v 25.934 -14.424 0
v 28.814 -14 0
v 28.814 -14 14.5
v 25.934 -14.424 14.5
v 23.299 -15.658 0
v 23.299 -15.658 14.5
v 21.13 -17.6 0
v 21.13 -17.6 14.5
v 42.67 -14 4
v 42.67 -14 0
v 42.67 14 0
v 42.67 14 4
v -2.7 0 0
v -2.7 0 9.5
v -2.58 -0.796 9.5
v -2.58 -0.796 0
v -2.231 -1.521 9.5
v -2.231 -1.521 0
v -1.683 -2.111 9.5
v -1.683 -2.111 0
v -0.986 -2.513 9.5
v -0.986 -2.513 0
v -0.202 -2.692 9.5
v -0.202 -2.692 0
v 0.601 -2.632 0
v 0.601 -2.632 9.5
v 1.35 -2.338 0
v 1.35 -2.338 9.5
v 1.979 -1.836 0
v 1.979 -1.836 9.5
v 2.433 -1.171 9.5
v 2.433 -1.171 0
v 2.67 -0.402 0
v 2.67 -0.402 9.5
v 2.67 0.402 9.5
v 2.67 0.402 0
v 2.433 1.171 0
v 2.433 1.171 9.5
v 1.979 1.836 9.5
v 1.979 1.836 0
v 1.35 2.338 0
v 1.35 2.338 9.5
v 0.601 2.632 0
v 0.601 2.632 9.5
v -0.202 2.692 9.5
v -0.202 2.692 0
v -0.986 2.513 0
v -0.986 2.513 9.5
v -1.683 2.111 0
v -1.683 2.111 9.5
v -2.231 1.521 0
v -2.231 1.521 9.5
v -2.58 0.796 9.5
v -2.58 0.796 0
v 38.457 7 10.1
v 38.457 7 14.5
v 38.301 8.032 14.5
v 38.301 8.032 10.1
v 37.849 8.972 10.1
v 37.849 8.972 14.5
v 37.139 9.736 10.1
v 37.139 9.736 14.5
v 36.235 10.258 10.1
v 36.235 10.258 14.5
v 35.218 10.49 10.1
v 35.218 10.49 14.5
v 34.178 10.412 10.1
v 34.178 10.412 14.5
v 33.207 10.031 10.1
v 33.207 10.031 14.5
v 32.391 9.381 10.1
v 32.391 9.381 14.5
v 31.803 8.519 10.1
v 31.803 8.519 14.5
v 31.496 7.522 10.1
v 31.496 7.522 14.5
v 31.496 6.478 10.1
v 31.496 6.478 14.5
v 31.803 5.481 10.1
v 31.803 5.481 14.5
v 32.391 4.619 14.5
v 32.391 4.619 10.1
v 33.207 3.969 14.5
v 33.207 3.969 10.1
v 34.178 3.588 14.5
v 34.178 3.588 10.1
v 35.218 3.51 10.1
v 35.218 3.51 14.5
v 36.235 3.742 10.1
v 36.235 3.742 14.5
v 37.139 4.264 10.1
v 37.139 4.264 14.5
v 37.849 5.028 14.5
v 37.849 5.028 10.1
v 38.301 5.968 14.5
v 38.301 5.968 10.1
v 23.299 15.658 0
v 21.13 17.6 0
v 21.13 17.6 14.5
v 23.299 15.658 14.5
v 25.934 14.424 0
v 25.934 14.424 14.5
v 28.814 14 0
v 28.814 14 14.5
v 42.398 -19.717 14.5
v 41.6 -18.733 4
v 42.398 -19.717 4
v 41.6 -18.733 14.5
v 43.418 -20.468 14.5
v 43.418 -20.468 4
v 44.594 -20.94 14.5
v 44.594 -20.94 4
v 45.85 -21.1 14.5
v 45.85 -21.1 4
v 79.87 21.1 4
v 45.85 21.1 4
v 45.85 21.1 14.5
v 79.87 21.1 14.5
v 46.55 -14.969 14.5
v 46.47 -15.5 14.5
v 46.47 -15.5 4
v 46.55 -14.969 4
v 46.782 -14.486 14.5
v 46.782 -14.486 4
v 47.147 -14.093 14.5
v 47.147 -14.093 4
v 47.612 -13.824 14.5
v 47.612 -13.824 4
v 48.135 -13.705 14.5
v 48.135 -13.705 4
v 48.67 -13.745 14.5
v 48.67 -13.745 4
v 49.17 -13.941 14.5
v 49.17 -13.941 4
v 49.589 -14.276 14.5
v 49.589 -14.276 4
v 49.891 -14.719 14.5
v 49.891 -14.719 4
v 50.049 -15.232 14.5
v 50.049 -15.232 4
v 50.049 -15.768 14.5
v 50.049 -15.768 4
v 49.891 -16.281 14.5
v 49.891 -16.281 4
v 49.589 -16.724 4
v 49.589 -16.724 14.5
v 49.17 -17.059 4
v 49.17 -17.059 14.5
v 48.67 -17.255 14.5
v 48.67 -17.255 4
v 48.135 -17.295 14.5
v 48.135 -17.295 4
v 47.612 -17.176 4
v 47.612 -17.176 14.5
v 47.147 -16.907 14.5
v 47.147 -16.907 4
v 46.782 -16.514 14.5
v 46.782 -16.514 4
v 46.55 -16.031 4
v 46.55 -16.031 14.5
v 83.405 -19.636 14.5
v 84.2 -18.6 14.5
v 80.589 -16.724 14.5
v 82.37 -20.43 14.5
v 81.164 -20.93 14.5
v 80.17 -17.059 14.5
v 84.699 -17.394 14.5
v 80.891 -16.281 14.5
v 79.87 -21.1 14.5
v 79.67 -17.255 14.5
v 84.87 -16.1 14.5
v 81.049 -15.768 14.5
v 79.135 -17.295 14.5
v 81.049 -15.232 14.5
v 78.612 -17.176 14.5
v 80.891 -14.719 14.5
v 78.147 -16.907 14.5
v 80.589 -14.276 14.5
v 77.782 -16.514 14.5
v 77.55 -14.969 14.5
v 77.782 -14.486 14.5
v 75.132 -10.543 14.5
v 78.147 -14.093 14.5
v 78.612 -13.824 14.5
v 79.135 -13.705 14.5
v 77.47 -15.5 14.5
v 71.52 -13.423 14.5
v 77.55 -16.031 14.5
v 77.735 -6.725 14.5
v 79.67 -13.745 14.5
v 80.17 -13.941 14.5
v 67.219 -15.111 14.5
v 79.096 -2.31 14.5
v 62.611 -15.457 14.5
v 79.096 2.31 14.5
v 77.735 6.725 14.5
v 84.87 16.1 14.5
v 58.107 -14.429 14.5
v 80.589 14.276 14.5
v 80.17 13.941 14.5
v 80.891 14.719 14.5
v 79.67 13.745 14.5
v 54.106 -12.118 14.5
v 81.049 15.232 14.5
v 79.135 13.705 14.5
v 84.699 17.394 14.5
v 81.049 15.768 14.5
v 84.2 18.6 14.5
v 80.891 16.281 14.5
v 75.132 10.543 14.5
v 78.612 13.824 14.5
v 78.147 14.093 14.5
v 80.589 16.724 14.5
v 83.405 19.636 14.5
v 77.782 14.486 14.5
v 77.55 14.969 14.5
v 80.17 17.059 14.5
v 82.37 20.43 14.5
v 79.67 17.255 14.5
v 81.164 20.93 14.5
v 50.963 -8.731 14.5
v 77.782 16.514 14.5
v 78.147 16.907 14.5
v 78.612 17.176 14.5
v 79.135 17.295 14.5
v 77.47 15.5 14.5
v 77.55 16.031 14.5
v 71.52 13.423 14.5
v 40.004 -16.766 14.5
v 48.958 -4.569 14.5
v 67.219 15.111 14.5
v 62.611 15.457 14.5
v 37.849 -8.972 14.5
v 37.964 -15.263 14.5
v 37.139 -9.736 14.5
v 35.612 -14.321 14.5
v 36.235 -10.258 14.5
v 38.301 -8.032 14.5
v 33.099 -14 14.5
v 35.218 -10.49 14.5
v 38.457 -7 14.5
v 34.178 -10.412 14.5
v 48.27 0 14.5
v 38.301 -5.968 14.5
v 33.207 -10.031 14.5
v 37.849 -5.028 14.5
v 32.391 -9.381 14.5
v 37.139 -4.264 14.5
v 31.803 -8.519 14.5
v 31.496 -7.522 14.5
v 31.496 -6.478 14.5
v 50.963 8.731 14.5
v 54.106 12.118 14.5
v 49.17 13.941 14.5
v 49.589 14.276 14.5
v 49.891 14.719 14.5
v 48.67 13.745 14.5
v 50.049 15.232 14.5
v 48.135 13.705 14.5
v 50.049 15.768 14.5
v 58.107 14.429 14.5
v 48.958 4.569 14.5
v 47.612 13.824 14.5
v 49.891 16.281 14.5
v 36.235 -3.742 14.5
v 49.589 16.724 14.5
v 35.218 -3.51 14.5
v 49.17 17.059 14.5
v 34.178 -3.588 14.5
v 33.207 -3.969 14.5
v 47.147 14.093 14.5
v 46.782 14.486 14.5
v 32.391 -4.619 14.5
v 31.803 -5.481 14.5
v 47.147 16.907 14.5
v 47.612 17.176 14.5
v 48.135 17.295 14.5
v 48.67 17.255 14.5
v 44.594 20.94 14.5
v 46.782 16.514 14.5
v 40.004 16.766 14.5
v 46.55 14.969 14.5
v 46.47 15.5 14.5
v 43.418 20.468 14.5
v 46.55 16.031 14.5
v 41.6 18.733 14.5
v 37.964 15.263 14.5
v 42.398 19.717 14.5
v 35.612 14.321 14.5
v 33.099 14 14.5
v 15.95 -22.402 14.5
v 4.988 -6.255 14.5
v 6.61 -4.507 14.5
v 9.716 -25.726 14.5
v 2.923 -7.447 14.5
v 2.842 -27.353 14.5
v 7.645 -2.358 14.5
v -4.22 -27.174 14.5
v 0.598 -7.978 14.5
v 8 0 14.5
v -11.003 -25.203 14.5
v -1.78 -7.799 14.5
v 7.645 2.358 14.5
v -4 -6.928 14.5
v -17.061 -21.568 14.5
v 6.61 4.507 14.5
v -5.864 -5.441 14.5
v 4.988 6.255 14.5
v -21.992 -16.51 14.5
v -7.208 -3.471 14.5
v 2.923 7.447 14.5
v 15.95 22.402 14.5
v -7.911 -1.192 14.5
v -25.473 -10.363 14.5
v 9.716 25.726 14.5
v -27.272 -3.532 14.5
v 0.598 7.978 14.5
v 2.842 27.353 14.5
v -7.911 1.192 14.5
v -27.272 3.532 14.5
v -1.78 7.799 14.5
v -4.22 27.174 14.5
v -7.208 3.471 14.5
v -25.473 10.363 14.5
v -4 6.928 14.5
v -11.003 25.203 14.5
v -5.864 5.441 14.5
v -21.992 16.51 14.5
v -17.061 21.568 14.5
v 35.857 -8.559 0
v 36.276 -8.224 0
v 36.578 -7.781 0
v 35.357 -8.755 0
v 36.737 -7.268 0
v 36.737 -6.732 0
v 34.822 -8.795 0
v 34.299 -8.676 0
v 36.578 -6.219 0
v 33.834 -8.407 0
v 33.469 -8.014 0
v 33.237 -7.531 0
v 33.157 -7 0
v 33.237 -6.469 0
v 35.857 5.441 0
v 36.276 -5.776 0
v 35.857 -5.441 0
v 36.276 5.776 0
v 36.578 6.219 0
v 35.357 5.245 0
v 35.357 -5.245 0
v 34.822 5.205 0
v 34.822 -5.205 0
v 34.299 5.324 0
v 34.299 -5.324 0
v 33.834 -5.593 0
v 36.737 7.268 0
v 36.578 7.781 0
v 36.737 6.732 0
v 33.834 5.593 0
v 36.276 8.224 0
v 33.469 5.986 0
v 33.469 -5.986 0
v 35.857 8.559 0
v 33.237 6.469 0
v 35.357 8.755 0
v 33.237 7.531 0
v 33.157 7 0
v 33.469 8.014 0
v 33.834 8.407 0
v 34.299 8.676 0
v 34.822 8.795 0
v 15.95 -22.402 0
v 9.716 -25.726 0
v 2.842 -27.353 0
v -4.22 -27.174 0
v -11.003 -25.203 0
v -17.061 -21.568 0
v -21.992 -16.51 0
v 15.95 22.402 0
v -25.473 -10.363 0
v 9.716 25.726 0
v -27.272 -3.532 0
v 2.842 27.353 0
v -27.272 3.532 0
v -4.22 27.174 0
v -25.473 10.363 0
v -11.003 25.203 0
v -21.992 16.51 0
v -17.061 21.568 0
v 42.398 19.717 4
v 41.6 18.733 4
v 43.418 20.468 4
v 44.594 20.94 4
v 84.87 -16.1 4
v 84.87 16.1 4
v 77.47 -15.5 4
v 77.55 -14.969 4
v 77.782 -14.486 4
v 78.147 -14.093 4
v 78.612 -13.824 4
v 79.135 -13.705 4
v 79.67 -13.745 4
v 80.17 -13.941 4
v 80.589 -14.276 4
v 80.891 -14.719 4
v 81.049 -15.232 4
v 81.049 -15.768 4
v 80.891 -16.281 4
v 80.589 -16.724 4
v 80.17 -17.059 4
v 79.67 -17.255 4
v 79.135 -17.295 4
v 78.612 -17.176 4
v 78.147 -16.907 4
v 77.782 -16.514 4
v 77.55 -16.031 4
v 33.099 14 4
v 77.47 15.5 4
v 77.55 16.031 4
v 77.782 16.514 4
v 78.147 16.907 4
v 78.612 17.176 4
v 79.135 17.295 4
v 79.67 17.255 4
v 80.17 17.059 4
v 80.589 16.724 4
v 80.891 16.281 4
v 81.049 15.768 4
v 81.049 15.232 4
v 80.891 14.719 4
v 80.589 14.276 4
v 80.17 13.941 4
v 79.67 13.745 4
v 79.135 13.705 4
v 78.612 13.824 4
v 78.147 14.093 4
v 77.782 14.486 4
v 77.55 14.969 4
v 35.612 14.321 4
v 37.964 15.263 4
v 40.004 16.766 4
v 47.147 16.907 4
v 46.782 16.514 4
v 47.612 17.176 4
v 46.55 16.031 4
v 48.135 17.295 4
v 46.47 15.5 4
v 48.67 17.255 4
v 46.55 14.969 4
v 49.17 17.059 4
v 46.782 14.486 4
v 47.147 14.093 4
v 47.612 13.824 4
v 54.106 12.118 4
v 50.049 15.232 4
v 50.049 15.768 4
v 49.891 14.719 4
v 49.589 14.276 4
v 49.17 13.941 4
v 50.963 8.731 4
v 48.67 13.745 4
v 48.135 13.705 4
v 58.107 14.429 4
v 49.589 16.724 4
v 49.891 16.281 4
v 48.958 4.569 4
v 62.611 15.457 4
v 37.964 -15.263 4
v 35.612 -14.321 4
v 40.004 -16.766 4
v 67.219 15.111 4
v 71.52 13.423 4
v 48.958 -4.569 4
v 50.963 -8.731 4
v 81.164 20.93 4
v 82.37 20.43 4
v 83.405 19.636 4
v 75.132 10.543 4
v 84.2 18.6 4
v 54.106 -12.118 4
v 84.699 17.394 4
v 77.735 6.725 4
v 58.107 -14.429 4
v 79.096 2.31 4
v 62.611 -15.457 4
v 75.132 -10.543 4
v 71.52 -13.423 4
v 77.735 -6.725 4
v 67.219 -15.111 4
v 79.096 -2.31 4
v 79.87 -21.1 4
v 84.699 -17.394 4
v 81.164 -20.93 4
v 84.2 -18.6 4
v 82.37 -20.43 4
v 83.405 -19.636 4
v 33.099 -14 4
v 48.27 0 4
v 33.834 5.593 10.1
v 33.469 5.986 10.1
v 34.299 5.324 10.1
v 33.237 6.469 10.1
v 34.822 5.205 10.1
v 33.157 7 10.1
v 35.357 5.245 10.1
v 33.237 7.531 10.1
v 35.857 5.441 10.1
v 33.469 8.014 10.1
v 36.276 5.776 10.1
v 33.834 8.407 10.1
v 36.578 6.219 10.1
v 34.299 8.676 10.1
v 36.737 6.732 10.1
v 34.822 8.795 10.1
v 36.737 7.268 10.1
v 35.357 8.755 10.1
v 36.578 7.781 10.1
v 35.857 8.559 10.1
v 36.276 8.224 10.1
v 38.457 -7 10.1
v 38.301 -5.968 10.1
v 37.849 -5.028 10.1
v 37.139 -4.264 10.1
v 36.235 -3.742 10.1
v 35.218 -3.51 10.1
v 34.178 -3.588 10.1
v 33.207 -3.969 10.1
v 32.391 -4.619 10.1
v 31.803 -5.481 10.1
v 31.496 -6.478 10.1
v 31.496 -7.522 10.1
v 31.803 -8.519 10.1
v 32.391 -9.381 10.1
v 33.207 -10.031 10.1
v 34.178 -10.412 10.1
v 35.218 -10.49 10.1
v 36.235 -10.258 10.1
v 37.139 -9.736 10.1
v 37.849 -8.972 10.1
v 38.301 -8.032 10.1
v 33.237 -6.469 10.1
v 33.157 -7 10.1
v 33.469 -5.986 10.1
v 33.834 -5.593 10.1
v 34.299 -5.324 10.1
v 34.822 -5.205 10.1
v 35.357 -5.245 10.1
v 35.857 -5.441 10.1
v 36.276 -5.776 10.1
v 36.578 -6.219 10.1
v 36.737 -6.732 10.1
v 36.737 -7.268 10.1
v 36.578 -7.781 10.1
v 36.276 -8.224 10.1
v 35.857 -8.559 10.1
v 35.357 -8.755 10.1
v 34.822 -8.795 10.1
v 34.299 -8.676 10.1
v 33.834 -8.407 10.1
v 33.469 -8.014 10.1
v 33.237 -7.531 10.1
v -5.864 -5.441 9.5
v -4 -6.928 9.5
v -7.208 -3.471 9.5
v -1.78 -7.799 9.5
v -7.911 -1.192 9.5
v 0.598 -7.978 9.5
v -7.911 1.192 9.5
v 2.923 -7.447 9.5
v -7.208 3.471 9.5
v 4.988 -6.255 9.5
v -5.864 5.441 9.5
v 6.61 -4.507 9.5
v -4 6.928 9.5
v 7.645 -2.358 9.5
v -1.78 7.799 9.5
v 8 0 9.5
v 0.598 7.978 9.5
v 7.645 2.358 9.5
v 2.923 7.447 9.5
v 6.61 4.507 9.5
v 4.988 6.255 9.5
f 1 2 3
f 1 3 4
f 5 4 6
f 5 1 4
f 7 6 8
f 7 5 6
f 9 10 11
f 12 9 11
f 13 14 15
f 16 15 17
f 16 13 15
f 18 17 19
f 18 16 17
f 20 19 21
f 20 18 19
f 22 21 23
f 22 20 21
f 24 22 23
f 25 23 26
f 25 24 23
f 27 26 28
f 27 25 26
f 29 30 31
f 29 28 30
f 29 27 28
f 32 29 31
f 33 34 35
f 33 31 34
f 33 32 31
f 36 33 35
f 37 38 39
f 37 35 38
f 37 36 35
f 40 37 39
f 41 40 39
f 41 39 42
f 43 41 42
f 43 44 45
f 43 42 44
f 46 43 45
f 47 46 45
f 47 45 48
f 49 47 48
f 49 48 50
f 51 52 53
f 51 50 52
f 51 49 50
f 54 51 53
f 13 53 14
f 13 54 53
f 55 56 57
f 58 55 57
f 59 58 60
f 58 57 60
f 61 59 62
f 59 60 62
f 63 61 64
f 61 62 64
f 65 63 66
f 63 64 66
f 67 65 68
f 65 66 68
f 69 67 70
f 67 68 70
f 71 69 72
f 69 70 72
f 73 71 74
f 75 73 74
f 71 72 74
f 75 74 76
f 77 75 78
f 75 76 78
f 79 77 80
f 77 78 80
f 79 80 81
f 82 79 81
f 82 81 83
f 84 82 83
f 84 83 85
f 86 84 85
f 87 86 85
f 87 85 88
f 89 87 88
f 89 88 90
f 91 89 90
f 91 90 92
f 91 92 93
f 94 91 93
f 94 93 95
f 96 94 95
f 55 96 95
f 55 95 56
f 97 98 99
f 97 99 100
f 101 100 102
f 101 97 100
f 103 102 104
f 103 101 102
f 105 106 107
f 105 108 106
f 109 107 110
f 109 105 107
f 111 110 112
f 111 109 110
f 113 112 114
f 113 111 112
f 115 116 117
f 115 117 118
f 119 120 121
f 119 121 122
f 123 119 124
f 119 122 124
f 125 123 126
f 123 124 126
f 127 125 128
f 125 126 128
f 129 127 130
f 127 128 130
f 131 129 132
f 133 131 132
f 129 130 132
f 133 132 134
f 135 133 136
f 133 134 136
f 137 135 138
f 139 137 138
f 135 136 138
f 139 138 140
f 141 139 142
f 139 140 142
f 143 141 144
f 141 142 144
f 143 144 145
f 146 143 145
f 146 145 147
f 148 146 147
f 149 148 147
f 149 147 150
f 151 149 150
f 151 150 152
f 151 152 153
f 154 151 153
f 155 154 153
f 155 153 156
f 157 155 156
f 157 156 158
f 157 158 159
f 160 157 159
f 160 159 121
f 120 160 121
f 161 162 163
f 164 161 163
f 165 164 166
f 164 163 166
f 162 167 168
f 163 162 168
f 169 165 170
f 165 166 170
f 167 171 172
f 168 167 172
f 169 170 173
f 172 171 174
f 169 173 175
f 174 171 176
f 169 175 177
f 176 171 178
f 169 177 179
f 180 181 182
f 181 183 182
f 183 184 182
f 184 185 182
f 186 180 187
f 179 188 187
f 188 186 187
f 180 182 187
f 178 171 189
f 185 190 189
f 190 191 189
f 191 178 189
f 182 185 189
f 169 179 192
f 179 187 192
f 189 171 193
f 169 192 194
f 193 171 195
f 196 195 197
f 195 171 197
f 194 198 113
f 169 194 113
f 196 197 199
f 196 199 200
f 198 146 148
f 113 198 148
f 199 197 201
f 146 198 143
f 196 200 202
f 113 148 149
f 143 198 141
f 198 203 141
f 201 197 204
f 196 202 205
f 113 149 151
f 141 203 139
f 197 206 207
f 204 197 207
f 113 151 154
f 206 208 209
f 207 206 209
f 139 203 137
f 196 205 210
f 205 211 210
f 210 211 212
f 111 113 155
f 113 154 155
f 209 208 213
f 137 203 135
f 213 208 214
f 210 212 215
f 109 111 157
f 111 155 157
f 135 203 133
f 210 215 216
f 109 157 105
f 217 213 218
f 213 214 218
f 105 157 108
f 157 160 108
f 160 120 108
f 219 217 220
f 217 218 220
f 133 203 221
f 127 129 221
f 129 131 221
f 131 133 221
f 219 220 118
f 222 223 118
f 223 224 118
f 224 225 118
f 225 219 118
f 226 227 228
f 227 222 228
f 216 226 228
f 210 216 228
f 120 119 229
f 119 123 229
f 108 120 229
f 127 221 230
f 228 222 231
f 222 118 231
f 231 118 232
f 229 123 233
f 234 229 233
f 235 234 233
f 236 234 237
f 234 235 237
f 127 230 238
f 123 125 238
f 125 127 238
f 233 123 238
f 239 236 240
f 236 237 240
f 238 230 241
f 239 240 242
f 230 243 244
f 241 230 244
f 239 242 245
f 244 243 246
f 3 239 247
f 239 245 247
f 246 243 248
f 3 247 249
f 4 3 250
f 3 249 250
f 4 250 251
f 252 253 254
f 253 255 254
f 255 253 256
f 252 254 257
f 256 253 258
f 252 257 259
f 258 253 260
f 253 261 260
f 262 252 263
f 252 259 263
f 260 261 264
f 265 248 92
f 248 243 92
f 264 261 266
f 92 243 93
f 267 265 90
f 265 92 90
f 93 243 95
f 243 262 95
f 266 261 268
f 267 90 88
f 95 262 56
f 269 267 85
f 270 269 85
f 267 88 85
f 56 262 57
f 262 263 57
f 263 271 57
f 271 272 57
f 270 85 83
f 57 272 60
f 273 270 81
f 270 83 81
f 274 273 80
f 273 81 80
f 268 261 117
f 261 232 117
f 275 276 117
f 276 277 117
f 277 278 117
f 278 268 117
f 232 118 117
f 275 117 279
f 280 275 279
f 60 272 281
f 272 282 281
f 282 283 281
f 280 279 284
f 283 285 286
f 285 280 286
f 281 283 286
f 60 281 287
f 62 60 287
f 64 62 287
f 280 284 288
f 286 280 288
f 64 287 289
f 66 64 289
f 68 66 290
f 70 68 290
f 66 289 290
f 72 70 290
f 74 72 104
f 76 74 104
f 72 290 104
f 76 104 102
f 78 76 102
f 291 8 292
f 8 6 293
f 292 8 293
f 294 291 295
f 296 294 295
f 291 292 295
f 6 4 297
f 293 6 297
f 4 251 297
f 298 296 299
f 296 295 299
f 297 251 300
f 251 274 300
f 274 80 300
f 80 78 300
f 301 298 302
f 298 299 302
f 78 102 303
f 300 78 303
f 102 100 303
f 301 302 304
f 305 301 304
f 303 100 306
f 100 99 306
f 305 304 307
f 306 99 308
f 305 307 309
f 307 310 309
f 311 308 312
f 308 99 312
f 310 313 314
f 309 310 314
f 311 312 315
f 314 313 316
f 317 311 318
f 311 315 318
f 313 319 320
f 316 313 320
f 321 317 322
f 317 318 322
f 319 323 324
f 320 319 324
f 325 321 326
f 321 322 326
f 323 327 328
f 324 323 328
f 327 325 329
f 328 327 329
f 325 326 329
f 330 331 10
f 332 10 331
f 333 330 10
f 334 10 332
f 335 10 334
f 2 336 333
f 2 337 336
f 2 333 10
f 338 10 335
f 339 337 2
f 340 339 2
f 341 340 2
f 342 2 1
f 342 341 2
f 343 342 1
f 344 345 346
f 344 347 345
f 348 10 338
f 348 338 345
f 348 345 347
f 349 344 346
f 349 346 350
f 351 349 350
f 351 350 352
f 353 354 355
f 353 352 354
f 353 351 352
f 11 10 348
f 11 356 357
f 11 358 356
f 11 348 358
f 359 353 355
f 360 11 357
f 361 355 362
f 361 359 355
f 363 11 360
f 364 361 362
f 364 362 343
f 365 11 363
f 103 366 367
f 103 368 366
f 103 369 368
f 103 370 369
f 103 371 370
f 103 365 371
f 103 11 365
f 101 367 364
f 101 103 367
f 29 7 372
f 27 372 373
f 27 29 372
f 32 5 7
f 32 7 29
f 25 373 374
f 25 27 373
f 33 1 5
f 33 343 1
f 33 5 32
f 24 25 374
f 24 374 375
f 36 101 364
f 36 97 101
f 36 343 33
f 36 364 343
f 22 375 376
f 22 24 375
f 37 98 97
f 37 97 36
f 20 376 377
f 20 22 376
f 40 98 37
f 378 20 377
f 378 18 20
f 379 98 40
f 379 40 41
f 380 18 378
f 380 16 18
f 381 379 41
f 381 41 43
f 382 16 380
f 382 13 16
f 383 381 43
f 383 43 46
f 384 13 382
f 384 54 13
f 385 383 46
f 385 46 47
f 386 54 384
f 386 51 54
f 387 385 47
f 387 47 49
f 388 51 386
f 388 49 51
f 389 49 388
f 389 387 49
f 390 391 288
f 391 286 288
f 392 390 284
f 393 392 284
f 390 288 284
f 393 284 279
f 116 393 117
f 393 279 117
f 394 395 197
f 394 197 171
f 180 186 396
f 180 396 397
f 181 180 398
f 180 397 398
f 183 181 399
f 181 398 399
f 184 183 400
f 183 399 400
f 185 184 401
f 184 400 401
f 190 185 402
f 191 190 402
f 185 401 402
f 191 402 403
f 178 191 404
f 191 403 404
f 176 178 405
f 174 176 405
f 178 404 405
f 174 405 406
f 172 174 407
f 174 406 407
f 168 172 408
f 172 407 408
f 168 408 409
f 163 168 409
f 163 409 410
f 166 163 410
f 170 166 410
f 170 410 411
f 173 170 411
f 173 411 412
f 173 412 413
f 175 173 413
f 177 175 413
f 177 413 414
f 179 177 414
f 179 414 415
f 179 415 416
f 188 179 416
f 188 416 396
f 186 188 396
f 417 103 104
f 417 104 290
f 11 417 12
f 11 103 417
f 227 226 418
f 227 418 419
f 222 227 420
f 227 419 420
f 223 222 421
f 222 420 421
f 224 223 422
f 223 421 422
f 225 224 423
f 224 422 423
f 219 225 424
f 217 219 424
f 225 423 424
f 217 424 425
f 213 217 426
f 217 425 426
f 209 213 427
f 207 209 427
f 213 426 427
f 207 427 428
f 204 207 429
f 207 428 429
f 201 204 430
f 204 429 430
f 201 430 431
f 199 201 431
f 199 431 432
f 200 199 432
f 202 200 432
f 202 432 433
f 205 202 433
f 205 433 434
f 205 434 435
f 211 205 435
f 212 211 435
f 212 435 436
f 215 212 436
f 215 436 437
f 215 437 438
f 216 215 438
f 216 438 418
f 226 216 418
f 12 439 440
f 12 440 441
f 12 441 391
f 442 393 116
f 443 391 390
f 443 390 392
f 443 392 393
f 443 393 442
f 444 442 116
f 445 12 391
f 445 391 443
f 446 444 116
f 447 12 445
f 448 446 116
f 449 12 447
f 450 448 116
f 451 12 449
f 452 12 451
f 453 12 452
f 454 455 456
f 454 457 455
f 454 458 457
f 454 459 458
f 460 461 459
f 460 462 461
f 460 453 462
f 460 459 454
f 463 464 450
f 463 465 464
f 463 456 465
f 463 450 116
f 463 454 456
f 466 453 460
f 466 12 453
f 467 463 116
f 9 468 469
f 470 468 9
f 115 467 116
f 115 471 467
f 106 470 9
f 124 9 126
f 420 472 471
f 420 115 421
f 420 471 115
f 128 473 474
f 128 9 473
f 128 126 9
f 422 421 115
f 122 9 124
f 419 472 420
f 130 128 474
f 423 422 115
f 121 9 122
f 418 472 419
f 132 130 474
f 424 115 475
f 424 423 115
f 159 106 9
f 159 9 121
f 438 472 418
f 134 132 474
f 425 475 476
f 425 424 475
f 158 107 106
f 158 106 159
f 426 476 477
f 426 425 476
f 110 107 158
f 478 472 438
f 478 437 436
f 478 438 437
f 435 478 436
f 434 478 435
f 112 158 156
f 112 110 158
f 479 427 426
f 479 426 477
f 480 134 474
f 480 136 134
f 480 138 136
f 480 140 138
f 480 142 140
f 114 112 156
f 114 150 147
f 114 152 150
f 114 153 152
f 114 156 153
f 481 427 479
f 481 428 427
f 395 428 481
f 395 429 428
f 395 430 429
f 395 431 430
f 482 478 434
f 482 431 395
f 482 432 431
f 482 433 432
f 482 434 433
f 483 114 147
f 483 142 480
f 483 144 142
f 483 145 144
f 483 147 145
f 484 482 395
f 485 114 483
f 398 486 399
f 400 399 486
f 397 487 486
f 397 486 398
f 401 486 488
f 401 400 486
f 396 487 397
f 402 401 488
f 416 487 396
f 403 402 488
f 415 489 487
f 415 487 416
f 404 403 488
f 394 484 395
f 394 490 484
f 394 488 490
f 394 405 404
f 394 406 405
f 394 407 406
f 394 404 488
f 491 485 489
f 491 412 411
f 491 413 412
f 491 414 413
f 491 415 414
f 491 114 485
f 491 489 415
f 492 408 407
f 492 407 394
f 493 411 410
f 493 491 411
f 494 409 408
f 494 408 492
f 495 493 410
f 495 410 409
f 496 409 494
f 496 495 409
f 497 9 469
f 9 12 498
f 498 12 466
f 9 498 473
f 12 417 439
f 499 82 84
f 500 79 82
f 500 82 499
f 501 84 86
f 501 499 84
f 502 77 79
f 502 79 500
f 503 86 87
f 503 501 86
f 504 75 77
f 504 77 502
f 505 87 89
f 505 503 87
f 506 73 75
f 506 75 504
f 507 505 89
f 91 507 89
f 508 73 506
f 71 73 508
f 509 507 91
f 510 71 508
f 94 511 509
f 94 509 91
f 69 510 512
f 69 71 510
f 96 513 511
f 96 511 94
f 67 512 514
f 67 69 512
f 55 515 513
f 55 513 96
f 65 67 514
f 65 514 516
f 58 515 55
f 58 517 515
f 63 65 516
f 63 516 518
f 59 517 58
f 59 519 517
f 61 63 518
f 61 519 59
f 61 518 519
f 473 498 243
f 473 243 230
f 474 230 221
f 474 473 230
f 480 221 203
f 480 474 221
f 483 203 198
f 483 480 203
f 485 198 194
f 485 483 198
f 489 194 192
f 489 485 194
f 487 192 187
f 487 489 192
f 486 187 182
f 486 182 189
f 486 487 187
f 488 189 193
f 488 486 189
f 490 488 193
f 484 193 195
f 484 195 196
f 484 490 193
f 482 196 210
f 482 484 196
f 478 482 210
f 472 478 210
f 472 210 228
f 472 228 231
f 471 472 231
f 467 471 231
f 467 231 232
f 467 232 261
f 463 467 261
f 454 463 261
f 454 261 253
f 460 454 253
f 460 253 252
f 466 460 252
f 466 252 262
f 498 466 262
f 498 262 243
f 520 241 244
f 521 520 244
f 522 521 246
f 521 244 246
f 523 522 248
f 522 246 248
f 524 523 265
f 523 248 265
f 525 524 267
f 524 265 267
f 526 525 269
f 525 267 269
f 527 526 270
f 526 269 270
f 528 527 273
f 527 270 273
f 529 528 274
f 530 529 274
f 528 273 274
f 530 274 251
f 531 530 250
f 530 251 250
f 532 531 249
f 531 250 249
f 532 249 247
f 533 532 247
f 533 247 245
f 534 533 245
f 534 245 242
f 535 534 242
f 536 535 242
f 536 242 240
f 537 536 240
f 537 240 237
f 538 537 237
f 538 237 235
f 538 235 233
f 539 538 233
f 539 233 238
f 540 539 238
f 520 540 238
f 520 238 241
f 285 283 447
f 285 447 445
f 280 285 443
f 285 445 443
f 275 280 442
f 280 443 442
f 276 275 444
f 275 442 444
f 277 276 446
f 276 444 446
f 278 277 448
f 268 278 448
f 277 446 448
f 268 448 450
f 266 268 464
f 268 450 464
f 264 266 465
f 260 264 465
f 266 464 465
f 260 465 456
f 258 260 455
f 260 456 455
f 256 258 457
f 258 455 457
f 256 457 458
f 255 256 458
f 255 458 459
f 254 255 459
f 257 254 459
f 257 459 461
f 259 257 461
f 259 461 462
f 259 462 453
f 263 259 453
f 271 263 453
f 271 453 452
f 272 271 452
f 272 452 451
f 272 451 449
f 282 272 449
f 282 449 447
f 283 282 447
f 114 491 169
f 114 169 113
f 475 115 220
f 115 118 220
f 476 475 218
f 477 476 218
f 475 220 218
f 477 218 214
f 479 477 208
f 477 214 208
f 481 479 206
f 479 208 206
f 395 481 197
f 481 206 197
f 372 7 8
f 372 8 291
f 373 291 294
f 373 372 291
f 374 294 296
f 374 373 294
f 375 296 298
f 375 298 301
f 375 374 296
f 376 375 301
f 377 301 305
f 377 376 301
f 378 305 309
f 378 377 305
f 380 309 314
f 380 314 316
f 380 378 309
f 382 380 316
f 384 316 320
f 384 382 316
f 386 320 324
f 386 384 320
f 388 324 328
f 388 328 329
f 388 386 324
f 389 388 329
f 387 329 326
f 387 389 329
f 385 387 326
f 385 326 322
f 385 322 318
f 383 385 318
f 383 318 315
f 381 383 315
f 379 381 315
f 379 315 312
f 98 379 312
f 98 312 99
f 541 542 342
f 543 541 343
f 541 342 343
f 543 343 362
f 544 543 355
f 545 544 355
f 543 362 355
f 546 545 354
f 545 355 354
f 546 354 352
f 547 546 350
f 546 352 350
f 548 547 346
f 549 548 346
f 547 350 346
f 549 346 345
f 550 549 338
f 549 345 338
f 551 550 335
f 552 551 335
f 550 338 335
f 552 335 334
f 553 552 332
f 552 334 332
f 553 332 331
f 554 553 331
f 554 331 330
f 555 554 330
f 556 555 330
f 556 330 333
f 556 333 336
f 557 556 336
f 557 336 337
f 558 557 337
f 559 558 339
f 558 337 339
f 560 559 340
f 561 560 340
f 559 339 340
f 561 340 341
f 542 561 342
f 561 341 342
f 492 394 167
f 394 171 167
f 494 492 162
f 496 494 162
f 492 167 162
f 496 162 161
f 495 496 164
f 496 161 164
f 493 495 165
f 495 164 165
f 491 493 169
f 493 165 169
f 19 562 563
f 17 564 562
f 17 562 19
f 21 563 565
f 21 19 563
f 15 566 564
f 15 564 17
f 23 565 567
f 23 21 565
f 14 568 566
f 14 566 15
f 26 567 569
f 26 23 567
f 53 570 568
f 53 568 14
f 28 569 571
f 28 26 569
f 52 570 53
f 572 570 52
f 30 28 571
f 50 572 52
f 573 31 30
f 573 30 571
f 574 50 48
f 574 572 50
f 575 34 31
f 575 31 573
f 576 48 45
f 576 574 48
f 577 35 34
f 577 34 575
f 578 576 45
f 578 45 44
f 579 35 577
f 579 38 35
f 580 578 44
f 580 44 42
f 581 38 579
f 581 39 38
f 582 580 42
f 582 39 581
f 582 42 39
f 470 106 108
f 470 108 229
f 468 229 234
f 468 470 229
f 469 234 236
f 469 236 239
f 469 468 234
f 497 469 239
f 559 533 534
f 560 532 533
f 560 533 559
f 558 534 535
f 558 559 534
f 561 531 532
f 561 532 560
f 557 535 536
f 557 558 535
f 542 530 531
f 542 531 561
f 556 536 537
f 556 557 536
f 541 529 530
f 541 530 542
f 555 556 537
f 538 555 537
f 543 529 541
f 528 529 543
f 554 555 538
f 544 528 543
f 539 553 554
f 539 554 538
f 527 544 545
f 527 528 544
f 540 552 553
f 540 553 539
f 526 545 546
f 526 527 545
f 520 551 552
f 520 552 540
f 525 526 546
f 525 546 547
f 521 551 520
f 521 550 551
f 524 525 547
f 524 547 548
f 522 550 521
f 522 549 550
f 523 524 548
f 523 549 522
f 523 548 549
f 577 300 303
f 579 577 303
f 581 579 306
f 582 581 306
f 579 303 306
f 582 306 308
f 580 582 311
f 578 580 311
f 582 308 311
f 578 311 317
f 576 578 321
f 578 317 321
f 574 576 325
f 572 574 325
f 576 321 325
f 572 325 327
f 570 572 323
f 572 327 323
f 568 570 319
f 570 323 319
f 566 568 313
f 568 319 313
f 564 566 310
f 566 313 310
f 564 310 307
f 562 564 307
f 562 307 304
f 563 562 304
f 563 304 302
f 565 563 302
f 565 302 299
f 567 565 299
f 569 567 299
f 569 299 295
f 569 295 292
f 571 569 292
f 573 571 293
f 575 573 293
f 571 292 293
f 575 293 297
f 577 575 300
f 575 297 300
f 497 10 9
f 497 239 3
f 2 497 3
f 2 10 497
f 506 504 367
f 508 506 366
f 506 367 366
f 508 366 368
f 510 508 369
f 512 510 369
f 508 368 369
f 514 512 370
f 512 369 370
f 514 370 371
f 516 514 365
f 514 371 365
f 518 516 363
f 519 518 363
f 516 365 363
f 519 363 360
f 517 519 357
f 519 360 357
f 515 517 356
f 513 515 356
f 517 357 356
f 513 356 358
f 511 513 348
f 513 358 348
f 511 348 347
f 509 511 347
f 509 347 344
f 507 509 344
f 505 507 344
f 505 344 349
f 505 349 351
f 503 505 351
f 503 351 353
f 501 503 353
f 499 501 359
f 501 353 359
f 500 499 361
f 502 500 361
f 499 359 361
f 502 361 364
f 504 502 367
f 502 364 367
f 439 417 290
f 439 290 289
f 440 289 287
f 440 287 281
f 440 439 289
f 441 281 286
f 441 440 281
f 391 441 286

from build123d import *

# Parameters (mm, degrees)
SKETCH1_R                                            = 15.5
SKETCH1_R_2                                          = 1.5
SKETCH1_R_3                                          = 2.7
BOSS_EXTRUDE1_DEPTH                                  = 14.5
SKETCH2_W                                            = 42.2
SKETCH2_H                                            = 42.2
CUT_EXTRUDE1_DEPTH                                   = 4
SKETCH3_R                                            = 8
CUT_EXTRUDE2_DEPTH                                   = 5
FILLET2_R                                            = 10
TALADRO_DE_MARGEN_PARA_M31_D                         = 3.6
SKETCH7_R                                            = 1.5
CUT_EXTRUDE3_DEPTH                                   = 91.38445183
REFRENTADO_PARA_TORNILLO_CON_CABEZA_TRON_D           = 3.6
REFRENTADO_PARA_TORNILLO_CON_CABEZA_TRON_CBORE_D     = 7
REFRENTADO_PARA_TORNILLO_CON_CABEZA_TRON_CBORE_DEPTH = 4.4
FILLET3_R                                            = 5


with BuildPart() as part:
    # Sketch1 → Boss-Extrude1 (new body)
    with BuildSketch(Plane.XY):
        with BuildLine():
            Line((42.669600757, 14), (42.669600757, 21.1))
            Line((42.669600757, 21.1), (84.869600757, 21.1))
            Line((84.869600757, 21.1), (84.869600757, -21.1))
            Line((84.869600757, -21.1), (42.669600757, -21.1))
            Line((42.669600757, -21.1), (42.669600757, -14))
            Line((42.669600757, -14), (23.669600757, -14))
            ThreePointArc((23.669600757, -14), (-27.5, 0), (23.669600757, 14))
            Line((23.669600757, 14), (42.669600757, 14))
        make_face()
        with Locations(Location((63.769600757, 0, 0), (0, 0, 180))):
            Circle(SKETCH1_R, mode=Mode.SUBTRACT)
        with Locations(Location((48.269600757, 15.5, 0), (0, 0, 180))):
            Circle(SKETCH1_R_2, mode=Mode.SUBTRACT)
        with Locations(Location((79.269600757, 15.5, 0), (0, 0, 180))):
            Circle(SKETCH1_R_2, mode=Mode.SUBTRACT)
        with Locations(Location((79.269600757, -15.5, 0), (0, 0, 180))):
            Circle(SKETCH1_R_2, mode=Mode.SUBTRACT)
        with Locations(Location((48.269600757, -15.5, 0), (0, 0, 180))):
            Circle(SKETCH1_R_2, mode=Mode.SUBTRACT)
        with Locations(Location((0, 0, 0), (0, 0, 180))):
            Circle(SKETCH1_R_3, mode=Mode.SUBTRACT)
    extrude(amount=BOSS_EXTRUDE1_DEPTH)

    # Sketch2 → Cut-Extrude1 (cut)
    with BuildSketch(Plane(origin=(0, 0, 0), x_dir=(-1, 0, 0), z_dir=(0, 0, -1))):
        with Locations((-63.769600757, 0)):
            Rectangle(SKETCH2_W, SKETCH2_H)
    extrude(amount=-CUT_EXTRUDE1_DEPTH, mode=Mode.SUBTRACT)

    # Sketch3 → Cut-Extrude2 (cut)
    with BuildSketch(Plane.XY.offset(14.5)):
        Circle(SKETCH3_R)
    extrude(amount=-CUT_EXTRUDE2_DEPTH, mode=Mode.SUBTRACT)

    # Fillet2
    # the kernel refuses this fillet: 10 mm, written as the material it adds along each edge
    with BuildSketch(Plane(origin=(42.669600757, -14, 4), x_dir=(-1, 0, 0), z_dir=(0, 0, 1))) as fillet2_piece_1:
        with BuildLine():
            CenterArc((9.570266454, 10), FILLET2_R, 196.857956022, 73.142043978)
            Line((0, 7.1), (0, 0))
            Line((0, 0), (9.570266454, 0))
        make_face()
    extrude(amount=10.5)
    with BuildSketch(Plane(origin=(42.669600757, 14, 4), x_dir=(-1, 0, 0), z_dir=(0, 0, 1))) as fillet2_piece_2:
        with BuildLine():
            CenterArc((9.570266454, -10), FILLET2_R, 90, 73.142043978)
            Line((0, -7.1), (0, 0))
            Line((0, 0), (9.570266454, 0))
        make_face()
    extrude(amount=10.5)
    with BuildSketch(Plane(origin=(23.669600757, -14, 0), x_dir=(-0.5763974746684583, -0.8171694751982751, 0), z_dir=(0, 0, 1))) as fillet2_piece_3:
        with BuildLine():
            CenterArc((5.206441973, 9.967869045), FILLET2_R, 215.197557054, 50.2081805)
            Line((-2.965252779, 4.203894298), (0, 0))
            ThreePointArc((0, 0), (2.20272545, 0.088360126), (4.4054509, 0))
        make_face()
    extrude(amount=14.5)
    with BuildSketch(Plane(origin=(23.669600757, 14, 0), x_dir=(1, 0, 0), z_dir=(0, 0, 1))) as fillet2_piece_4:
        with BuildLine():
            CenterArc((5.144458311, 10), FILLET2_R, 219.7918195, 50.2081805)
            ThreePointArc((-2.539290774, 3.6), (-1.197440189, 1.850930553), (0, 0))
            Line((0, 0), (5.144458311, 0))
        make_face()
    extrude(amount=14.5)

    # Taladro de margen para M31 (through all)
    with Locations(Plane.XY.offset(14.5)):
        with Locations((79.269600757, -15.5), (79.269600757, 15.5), (48.269600757, 15.5), (48.269600757, -15.5)):
            Hole(TALADRO_DE_MARGEN_PARA_M31_D / 2)

    # Sketch7 → Cut-Extrude3 (cut, through all)
    with BuildSketch(Plane.XY.offset(14.5)):
        with Locations((34.956696686, 7)):
            Circle(SKETCH7_R)
        with Locations((34.956696686, -7)):
            Circle(SKETCH7_R)
    extrude(amount=-CUT_EXTRUDE3_DEPTH, mode=Mode.SUBTRACT)

    # Refrentado para tornillo con cabeza troncocónica de M31 (through all)
    with Locations(Plane.XY.offset(14.5)):
        with Locations((34.956696686, 7), (34.956696686, -7)):
            CounterBoreHole(REFRENTADO_PARA_TORNILLO_CON_CABEZA_TRON_D / 2, REFRENTADO_PARA_TORNILLO_CON_CABEZA_TRON_CBORE_D / 2, REFRENTADO_PARA_TORNILLO_CON_CABEZA_TRON_CBORE_DEPTH)

    # Fillet3
    fillet3_edges = [part.edges().sort_by_distance(p)[0] for p in [
        (84.869600757, -21.1, 9.25),
        (42.669600757, -21.1, 9.25),
        (42.669600757, 21.1, 9.25),
        (84.869600757, 21.1, 9.25),
    ]]
    fillet(fillet3_edges, radius=FILLET3_R)


solid = part.part
